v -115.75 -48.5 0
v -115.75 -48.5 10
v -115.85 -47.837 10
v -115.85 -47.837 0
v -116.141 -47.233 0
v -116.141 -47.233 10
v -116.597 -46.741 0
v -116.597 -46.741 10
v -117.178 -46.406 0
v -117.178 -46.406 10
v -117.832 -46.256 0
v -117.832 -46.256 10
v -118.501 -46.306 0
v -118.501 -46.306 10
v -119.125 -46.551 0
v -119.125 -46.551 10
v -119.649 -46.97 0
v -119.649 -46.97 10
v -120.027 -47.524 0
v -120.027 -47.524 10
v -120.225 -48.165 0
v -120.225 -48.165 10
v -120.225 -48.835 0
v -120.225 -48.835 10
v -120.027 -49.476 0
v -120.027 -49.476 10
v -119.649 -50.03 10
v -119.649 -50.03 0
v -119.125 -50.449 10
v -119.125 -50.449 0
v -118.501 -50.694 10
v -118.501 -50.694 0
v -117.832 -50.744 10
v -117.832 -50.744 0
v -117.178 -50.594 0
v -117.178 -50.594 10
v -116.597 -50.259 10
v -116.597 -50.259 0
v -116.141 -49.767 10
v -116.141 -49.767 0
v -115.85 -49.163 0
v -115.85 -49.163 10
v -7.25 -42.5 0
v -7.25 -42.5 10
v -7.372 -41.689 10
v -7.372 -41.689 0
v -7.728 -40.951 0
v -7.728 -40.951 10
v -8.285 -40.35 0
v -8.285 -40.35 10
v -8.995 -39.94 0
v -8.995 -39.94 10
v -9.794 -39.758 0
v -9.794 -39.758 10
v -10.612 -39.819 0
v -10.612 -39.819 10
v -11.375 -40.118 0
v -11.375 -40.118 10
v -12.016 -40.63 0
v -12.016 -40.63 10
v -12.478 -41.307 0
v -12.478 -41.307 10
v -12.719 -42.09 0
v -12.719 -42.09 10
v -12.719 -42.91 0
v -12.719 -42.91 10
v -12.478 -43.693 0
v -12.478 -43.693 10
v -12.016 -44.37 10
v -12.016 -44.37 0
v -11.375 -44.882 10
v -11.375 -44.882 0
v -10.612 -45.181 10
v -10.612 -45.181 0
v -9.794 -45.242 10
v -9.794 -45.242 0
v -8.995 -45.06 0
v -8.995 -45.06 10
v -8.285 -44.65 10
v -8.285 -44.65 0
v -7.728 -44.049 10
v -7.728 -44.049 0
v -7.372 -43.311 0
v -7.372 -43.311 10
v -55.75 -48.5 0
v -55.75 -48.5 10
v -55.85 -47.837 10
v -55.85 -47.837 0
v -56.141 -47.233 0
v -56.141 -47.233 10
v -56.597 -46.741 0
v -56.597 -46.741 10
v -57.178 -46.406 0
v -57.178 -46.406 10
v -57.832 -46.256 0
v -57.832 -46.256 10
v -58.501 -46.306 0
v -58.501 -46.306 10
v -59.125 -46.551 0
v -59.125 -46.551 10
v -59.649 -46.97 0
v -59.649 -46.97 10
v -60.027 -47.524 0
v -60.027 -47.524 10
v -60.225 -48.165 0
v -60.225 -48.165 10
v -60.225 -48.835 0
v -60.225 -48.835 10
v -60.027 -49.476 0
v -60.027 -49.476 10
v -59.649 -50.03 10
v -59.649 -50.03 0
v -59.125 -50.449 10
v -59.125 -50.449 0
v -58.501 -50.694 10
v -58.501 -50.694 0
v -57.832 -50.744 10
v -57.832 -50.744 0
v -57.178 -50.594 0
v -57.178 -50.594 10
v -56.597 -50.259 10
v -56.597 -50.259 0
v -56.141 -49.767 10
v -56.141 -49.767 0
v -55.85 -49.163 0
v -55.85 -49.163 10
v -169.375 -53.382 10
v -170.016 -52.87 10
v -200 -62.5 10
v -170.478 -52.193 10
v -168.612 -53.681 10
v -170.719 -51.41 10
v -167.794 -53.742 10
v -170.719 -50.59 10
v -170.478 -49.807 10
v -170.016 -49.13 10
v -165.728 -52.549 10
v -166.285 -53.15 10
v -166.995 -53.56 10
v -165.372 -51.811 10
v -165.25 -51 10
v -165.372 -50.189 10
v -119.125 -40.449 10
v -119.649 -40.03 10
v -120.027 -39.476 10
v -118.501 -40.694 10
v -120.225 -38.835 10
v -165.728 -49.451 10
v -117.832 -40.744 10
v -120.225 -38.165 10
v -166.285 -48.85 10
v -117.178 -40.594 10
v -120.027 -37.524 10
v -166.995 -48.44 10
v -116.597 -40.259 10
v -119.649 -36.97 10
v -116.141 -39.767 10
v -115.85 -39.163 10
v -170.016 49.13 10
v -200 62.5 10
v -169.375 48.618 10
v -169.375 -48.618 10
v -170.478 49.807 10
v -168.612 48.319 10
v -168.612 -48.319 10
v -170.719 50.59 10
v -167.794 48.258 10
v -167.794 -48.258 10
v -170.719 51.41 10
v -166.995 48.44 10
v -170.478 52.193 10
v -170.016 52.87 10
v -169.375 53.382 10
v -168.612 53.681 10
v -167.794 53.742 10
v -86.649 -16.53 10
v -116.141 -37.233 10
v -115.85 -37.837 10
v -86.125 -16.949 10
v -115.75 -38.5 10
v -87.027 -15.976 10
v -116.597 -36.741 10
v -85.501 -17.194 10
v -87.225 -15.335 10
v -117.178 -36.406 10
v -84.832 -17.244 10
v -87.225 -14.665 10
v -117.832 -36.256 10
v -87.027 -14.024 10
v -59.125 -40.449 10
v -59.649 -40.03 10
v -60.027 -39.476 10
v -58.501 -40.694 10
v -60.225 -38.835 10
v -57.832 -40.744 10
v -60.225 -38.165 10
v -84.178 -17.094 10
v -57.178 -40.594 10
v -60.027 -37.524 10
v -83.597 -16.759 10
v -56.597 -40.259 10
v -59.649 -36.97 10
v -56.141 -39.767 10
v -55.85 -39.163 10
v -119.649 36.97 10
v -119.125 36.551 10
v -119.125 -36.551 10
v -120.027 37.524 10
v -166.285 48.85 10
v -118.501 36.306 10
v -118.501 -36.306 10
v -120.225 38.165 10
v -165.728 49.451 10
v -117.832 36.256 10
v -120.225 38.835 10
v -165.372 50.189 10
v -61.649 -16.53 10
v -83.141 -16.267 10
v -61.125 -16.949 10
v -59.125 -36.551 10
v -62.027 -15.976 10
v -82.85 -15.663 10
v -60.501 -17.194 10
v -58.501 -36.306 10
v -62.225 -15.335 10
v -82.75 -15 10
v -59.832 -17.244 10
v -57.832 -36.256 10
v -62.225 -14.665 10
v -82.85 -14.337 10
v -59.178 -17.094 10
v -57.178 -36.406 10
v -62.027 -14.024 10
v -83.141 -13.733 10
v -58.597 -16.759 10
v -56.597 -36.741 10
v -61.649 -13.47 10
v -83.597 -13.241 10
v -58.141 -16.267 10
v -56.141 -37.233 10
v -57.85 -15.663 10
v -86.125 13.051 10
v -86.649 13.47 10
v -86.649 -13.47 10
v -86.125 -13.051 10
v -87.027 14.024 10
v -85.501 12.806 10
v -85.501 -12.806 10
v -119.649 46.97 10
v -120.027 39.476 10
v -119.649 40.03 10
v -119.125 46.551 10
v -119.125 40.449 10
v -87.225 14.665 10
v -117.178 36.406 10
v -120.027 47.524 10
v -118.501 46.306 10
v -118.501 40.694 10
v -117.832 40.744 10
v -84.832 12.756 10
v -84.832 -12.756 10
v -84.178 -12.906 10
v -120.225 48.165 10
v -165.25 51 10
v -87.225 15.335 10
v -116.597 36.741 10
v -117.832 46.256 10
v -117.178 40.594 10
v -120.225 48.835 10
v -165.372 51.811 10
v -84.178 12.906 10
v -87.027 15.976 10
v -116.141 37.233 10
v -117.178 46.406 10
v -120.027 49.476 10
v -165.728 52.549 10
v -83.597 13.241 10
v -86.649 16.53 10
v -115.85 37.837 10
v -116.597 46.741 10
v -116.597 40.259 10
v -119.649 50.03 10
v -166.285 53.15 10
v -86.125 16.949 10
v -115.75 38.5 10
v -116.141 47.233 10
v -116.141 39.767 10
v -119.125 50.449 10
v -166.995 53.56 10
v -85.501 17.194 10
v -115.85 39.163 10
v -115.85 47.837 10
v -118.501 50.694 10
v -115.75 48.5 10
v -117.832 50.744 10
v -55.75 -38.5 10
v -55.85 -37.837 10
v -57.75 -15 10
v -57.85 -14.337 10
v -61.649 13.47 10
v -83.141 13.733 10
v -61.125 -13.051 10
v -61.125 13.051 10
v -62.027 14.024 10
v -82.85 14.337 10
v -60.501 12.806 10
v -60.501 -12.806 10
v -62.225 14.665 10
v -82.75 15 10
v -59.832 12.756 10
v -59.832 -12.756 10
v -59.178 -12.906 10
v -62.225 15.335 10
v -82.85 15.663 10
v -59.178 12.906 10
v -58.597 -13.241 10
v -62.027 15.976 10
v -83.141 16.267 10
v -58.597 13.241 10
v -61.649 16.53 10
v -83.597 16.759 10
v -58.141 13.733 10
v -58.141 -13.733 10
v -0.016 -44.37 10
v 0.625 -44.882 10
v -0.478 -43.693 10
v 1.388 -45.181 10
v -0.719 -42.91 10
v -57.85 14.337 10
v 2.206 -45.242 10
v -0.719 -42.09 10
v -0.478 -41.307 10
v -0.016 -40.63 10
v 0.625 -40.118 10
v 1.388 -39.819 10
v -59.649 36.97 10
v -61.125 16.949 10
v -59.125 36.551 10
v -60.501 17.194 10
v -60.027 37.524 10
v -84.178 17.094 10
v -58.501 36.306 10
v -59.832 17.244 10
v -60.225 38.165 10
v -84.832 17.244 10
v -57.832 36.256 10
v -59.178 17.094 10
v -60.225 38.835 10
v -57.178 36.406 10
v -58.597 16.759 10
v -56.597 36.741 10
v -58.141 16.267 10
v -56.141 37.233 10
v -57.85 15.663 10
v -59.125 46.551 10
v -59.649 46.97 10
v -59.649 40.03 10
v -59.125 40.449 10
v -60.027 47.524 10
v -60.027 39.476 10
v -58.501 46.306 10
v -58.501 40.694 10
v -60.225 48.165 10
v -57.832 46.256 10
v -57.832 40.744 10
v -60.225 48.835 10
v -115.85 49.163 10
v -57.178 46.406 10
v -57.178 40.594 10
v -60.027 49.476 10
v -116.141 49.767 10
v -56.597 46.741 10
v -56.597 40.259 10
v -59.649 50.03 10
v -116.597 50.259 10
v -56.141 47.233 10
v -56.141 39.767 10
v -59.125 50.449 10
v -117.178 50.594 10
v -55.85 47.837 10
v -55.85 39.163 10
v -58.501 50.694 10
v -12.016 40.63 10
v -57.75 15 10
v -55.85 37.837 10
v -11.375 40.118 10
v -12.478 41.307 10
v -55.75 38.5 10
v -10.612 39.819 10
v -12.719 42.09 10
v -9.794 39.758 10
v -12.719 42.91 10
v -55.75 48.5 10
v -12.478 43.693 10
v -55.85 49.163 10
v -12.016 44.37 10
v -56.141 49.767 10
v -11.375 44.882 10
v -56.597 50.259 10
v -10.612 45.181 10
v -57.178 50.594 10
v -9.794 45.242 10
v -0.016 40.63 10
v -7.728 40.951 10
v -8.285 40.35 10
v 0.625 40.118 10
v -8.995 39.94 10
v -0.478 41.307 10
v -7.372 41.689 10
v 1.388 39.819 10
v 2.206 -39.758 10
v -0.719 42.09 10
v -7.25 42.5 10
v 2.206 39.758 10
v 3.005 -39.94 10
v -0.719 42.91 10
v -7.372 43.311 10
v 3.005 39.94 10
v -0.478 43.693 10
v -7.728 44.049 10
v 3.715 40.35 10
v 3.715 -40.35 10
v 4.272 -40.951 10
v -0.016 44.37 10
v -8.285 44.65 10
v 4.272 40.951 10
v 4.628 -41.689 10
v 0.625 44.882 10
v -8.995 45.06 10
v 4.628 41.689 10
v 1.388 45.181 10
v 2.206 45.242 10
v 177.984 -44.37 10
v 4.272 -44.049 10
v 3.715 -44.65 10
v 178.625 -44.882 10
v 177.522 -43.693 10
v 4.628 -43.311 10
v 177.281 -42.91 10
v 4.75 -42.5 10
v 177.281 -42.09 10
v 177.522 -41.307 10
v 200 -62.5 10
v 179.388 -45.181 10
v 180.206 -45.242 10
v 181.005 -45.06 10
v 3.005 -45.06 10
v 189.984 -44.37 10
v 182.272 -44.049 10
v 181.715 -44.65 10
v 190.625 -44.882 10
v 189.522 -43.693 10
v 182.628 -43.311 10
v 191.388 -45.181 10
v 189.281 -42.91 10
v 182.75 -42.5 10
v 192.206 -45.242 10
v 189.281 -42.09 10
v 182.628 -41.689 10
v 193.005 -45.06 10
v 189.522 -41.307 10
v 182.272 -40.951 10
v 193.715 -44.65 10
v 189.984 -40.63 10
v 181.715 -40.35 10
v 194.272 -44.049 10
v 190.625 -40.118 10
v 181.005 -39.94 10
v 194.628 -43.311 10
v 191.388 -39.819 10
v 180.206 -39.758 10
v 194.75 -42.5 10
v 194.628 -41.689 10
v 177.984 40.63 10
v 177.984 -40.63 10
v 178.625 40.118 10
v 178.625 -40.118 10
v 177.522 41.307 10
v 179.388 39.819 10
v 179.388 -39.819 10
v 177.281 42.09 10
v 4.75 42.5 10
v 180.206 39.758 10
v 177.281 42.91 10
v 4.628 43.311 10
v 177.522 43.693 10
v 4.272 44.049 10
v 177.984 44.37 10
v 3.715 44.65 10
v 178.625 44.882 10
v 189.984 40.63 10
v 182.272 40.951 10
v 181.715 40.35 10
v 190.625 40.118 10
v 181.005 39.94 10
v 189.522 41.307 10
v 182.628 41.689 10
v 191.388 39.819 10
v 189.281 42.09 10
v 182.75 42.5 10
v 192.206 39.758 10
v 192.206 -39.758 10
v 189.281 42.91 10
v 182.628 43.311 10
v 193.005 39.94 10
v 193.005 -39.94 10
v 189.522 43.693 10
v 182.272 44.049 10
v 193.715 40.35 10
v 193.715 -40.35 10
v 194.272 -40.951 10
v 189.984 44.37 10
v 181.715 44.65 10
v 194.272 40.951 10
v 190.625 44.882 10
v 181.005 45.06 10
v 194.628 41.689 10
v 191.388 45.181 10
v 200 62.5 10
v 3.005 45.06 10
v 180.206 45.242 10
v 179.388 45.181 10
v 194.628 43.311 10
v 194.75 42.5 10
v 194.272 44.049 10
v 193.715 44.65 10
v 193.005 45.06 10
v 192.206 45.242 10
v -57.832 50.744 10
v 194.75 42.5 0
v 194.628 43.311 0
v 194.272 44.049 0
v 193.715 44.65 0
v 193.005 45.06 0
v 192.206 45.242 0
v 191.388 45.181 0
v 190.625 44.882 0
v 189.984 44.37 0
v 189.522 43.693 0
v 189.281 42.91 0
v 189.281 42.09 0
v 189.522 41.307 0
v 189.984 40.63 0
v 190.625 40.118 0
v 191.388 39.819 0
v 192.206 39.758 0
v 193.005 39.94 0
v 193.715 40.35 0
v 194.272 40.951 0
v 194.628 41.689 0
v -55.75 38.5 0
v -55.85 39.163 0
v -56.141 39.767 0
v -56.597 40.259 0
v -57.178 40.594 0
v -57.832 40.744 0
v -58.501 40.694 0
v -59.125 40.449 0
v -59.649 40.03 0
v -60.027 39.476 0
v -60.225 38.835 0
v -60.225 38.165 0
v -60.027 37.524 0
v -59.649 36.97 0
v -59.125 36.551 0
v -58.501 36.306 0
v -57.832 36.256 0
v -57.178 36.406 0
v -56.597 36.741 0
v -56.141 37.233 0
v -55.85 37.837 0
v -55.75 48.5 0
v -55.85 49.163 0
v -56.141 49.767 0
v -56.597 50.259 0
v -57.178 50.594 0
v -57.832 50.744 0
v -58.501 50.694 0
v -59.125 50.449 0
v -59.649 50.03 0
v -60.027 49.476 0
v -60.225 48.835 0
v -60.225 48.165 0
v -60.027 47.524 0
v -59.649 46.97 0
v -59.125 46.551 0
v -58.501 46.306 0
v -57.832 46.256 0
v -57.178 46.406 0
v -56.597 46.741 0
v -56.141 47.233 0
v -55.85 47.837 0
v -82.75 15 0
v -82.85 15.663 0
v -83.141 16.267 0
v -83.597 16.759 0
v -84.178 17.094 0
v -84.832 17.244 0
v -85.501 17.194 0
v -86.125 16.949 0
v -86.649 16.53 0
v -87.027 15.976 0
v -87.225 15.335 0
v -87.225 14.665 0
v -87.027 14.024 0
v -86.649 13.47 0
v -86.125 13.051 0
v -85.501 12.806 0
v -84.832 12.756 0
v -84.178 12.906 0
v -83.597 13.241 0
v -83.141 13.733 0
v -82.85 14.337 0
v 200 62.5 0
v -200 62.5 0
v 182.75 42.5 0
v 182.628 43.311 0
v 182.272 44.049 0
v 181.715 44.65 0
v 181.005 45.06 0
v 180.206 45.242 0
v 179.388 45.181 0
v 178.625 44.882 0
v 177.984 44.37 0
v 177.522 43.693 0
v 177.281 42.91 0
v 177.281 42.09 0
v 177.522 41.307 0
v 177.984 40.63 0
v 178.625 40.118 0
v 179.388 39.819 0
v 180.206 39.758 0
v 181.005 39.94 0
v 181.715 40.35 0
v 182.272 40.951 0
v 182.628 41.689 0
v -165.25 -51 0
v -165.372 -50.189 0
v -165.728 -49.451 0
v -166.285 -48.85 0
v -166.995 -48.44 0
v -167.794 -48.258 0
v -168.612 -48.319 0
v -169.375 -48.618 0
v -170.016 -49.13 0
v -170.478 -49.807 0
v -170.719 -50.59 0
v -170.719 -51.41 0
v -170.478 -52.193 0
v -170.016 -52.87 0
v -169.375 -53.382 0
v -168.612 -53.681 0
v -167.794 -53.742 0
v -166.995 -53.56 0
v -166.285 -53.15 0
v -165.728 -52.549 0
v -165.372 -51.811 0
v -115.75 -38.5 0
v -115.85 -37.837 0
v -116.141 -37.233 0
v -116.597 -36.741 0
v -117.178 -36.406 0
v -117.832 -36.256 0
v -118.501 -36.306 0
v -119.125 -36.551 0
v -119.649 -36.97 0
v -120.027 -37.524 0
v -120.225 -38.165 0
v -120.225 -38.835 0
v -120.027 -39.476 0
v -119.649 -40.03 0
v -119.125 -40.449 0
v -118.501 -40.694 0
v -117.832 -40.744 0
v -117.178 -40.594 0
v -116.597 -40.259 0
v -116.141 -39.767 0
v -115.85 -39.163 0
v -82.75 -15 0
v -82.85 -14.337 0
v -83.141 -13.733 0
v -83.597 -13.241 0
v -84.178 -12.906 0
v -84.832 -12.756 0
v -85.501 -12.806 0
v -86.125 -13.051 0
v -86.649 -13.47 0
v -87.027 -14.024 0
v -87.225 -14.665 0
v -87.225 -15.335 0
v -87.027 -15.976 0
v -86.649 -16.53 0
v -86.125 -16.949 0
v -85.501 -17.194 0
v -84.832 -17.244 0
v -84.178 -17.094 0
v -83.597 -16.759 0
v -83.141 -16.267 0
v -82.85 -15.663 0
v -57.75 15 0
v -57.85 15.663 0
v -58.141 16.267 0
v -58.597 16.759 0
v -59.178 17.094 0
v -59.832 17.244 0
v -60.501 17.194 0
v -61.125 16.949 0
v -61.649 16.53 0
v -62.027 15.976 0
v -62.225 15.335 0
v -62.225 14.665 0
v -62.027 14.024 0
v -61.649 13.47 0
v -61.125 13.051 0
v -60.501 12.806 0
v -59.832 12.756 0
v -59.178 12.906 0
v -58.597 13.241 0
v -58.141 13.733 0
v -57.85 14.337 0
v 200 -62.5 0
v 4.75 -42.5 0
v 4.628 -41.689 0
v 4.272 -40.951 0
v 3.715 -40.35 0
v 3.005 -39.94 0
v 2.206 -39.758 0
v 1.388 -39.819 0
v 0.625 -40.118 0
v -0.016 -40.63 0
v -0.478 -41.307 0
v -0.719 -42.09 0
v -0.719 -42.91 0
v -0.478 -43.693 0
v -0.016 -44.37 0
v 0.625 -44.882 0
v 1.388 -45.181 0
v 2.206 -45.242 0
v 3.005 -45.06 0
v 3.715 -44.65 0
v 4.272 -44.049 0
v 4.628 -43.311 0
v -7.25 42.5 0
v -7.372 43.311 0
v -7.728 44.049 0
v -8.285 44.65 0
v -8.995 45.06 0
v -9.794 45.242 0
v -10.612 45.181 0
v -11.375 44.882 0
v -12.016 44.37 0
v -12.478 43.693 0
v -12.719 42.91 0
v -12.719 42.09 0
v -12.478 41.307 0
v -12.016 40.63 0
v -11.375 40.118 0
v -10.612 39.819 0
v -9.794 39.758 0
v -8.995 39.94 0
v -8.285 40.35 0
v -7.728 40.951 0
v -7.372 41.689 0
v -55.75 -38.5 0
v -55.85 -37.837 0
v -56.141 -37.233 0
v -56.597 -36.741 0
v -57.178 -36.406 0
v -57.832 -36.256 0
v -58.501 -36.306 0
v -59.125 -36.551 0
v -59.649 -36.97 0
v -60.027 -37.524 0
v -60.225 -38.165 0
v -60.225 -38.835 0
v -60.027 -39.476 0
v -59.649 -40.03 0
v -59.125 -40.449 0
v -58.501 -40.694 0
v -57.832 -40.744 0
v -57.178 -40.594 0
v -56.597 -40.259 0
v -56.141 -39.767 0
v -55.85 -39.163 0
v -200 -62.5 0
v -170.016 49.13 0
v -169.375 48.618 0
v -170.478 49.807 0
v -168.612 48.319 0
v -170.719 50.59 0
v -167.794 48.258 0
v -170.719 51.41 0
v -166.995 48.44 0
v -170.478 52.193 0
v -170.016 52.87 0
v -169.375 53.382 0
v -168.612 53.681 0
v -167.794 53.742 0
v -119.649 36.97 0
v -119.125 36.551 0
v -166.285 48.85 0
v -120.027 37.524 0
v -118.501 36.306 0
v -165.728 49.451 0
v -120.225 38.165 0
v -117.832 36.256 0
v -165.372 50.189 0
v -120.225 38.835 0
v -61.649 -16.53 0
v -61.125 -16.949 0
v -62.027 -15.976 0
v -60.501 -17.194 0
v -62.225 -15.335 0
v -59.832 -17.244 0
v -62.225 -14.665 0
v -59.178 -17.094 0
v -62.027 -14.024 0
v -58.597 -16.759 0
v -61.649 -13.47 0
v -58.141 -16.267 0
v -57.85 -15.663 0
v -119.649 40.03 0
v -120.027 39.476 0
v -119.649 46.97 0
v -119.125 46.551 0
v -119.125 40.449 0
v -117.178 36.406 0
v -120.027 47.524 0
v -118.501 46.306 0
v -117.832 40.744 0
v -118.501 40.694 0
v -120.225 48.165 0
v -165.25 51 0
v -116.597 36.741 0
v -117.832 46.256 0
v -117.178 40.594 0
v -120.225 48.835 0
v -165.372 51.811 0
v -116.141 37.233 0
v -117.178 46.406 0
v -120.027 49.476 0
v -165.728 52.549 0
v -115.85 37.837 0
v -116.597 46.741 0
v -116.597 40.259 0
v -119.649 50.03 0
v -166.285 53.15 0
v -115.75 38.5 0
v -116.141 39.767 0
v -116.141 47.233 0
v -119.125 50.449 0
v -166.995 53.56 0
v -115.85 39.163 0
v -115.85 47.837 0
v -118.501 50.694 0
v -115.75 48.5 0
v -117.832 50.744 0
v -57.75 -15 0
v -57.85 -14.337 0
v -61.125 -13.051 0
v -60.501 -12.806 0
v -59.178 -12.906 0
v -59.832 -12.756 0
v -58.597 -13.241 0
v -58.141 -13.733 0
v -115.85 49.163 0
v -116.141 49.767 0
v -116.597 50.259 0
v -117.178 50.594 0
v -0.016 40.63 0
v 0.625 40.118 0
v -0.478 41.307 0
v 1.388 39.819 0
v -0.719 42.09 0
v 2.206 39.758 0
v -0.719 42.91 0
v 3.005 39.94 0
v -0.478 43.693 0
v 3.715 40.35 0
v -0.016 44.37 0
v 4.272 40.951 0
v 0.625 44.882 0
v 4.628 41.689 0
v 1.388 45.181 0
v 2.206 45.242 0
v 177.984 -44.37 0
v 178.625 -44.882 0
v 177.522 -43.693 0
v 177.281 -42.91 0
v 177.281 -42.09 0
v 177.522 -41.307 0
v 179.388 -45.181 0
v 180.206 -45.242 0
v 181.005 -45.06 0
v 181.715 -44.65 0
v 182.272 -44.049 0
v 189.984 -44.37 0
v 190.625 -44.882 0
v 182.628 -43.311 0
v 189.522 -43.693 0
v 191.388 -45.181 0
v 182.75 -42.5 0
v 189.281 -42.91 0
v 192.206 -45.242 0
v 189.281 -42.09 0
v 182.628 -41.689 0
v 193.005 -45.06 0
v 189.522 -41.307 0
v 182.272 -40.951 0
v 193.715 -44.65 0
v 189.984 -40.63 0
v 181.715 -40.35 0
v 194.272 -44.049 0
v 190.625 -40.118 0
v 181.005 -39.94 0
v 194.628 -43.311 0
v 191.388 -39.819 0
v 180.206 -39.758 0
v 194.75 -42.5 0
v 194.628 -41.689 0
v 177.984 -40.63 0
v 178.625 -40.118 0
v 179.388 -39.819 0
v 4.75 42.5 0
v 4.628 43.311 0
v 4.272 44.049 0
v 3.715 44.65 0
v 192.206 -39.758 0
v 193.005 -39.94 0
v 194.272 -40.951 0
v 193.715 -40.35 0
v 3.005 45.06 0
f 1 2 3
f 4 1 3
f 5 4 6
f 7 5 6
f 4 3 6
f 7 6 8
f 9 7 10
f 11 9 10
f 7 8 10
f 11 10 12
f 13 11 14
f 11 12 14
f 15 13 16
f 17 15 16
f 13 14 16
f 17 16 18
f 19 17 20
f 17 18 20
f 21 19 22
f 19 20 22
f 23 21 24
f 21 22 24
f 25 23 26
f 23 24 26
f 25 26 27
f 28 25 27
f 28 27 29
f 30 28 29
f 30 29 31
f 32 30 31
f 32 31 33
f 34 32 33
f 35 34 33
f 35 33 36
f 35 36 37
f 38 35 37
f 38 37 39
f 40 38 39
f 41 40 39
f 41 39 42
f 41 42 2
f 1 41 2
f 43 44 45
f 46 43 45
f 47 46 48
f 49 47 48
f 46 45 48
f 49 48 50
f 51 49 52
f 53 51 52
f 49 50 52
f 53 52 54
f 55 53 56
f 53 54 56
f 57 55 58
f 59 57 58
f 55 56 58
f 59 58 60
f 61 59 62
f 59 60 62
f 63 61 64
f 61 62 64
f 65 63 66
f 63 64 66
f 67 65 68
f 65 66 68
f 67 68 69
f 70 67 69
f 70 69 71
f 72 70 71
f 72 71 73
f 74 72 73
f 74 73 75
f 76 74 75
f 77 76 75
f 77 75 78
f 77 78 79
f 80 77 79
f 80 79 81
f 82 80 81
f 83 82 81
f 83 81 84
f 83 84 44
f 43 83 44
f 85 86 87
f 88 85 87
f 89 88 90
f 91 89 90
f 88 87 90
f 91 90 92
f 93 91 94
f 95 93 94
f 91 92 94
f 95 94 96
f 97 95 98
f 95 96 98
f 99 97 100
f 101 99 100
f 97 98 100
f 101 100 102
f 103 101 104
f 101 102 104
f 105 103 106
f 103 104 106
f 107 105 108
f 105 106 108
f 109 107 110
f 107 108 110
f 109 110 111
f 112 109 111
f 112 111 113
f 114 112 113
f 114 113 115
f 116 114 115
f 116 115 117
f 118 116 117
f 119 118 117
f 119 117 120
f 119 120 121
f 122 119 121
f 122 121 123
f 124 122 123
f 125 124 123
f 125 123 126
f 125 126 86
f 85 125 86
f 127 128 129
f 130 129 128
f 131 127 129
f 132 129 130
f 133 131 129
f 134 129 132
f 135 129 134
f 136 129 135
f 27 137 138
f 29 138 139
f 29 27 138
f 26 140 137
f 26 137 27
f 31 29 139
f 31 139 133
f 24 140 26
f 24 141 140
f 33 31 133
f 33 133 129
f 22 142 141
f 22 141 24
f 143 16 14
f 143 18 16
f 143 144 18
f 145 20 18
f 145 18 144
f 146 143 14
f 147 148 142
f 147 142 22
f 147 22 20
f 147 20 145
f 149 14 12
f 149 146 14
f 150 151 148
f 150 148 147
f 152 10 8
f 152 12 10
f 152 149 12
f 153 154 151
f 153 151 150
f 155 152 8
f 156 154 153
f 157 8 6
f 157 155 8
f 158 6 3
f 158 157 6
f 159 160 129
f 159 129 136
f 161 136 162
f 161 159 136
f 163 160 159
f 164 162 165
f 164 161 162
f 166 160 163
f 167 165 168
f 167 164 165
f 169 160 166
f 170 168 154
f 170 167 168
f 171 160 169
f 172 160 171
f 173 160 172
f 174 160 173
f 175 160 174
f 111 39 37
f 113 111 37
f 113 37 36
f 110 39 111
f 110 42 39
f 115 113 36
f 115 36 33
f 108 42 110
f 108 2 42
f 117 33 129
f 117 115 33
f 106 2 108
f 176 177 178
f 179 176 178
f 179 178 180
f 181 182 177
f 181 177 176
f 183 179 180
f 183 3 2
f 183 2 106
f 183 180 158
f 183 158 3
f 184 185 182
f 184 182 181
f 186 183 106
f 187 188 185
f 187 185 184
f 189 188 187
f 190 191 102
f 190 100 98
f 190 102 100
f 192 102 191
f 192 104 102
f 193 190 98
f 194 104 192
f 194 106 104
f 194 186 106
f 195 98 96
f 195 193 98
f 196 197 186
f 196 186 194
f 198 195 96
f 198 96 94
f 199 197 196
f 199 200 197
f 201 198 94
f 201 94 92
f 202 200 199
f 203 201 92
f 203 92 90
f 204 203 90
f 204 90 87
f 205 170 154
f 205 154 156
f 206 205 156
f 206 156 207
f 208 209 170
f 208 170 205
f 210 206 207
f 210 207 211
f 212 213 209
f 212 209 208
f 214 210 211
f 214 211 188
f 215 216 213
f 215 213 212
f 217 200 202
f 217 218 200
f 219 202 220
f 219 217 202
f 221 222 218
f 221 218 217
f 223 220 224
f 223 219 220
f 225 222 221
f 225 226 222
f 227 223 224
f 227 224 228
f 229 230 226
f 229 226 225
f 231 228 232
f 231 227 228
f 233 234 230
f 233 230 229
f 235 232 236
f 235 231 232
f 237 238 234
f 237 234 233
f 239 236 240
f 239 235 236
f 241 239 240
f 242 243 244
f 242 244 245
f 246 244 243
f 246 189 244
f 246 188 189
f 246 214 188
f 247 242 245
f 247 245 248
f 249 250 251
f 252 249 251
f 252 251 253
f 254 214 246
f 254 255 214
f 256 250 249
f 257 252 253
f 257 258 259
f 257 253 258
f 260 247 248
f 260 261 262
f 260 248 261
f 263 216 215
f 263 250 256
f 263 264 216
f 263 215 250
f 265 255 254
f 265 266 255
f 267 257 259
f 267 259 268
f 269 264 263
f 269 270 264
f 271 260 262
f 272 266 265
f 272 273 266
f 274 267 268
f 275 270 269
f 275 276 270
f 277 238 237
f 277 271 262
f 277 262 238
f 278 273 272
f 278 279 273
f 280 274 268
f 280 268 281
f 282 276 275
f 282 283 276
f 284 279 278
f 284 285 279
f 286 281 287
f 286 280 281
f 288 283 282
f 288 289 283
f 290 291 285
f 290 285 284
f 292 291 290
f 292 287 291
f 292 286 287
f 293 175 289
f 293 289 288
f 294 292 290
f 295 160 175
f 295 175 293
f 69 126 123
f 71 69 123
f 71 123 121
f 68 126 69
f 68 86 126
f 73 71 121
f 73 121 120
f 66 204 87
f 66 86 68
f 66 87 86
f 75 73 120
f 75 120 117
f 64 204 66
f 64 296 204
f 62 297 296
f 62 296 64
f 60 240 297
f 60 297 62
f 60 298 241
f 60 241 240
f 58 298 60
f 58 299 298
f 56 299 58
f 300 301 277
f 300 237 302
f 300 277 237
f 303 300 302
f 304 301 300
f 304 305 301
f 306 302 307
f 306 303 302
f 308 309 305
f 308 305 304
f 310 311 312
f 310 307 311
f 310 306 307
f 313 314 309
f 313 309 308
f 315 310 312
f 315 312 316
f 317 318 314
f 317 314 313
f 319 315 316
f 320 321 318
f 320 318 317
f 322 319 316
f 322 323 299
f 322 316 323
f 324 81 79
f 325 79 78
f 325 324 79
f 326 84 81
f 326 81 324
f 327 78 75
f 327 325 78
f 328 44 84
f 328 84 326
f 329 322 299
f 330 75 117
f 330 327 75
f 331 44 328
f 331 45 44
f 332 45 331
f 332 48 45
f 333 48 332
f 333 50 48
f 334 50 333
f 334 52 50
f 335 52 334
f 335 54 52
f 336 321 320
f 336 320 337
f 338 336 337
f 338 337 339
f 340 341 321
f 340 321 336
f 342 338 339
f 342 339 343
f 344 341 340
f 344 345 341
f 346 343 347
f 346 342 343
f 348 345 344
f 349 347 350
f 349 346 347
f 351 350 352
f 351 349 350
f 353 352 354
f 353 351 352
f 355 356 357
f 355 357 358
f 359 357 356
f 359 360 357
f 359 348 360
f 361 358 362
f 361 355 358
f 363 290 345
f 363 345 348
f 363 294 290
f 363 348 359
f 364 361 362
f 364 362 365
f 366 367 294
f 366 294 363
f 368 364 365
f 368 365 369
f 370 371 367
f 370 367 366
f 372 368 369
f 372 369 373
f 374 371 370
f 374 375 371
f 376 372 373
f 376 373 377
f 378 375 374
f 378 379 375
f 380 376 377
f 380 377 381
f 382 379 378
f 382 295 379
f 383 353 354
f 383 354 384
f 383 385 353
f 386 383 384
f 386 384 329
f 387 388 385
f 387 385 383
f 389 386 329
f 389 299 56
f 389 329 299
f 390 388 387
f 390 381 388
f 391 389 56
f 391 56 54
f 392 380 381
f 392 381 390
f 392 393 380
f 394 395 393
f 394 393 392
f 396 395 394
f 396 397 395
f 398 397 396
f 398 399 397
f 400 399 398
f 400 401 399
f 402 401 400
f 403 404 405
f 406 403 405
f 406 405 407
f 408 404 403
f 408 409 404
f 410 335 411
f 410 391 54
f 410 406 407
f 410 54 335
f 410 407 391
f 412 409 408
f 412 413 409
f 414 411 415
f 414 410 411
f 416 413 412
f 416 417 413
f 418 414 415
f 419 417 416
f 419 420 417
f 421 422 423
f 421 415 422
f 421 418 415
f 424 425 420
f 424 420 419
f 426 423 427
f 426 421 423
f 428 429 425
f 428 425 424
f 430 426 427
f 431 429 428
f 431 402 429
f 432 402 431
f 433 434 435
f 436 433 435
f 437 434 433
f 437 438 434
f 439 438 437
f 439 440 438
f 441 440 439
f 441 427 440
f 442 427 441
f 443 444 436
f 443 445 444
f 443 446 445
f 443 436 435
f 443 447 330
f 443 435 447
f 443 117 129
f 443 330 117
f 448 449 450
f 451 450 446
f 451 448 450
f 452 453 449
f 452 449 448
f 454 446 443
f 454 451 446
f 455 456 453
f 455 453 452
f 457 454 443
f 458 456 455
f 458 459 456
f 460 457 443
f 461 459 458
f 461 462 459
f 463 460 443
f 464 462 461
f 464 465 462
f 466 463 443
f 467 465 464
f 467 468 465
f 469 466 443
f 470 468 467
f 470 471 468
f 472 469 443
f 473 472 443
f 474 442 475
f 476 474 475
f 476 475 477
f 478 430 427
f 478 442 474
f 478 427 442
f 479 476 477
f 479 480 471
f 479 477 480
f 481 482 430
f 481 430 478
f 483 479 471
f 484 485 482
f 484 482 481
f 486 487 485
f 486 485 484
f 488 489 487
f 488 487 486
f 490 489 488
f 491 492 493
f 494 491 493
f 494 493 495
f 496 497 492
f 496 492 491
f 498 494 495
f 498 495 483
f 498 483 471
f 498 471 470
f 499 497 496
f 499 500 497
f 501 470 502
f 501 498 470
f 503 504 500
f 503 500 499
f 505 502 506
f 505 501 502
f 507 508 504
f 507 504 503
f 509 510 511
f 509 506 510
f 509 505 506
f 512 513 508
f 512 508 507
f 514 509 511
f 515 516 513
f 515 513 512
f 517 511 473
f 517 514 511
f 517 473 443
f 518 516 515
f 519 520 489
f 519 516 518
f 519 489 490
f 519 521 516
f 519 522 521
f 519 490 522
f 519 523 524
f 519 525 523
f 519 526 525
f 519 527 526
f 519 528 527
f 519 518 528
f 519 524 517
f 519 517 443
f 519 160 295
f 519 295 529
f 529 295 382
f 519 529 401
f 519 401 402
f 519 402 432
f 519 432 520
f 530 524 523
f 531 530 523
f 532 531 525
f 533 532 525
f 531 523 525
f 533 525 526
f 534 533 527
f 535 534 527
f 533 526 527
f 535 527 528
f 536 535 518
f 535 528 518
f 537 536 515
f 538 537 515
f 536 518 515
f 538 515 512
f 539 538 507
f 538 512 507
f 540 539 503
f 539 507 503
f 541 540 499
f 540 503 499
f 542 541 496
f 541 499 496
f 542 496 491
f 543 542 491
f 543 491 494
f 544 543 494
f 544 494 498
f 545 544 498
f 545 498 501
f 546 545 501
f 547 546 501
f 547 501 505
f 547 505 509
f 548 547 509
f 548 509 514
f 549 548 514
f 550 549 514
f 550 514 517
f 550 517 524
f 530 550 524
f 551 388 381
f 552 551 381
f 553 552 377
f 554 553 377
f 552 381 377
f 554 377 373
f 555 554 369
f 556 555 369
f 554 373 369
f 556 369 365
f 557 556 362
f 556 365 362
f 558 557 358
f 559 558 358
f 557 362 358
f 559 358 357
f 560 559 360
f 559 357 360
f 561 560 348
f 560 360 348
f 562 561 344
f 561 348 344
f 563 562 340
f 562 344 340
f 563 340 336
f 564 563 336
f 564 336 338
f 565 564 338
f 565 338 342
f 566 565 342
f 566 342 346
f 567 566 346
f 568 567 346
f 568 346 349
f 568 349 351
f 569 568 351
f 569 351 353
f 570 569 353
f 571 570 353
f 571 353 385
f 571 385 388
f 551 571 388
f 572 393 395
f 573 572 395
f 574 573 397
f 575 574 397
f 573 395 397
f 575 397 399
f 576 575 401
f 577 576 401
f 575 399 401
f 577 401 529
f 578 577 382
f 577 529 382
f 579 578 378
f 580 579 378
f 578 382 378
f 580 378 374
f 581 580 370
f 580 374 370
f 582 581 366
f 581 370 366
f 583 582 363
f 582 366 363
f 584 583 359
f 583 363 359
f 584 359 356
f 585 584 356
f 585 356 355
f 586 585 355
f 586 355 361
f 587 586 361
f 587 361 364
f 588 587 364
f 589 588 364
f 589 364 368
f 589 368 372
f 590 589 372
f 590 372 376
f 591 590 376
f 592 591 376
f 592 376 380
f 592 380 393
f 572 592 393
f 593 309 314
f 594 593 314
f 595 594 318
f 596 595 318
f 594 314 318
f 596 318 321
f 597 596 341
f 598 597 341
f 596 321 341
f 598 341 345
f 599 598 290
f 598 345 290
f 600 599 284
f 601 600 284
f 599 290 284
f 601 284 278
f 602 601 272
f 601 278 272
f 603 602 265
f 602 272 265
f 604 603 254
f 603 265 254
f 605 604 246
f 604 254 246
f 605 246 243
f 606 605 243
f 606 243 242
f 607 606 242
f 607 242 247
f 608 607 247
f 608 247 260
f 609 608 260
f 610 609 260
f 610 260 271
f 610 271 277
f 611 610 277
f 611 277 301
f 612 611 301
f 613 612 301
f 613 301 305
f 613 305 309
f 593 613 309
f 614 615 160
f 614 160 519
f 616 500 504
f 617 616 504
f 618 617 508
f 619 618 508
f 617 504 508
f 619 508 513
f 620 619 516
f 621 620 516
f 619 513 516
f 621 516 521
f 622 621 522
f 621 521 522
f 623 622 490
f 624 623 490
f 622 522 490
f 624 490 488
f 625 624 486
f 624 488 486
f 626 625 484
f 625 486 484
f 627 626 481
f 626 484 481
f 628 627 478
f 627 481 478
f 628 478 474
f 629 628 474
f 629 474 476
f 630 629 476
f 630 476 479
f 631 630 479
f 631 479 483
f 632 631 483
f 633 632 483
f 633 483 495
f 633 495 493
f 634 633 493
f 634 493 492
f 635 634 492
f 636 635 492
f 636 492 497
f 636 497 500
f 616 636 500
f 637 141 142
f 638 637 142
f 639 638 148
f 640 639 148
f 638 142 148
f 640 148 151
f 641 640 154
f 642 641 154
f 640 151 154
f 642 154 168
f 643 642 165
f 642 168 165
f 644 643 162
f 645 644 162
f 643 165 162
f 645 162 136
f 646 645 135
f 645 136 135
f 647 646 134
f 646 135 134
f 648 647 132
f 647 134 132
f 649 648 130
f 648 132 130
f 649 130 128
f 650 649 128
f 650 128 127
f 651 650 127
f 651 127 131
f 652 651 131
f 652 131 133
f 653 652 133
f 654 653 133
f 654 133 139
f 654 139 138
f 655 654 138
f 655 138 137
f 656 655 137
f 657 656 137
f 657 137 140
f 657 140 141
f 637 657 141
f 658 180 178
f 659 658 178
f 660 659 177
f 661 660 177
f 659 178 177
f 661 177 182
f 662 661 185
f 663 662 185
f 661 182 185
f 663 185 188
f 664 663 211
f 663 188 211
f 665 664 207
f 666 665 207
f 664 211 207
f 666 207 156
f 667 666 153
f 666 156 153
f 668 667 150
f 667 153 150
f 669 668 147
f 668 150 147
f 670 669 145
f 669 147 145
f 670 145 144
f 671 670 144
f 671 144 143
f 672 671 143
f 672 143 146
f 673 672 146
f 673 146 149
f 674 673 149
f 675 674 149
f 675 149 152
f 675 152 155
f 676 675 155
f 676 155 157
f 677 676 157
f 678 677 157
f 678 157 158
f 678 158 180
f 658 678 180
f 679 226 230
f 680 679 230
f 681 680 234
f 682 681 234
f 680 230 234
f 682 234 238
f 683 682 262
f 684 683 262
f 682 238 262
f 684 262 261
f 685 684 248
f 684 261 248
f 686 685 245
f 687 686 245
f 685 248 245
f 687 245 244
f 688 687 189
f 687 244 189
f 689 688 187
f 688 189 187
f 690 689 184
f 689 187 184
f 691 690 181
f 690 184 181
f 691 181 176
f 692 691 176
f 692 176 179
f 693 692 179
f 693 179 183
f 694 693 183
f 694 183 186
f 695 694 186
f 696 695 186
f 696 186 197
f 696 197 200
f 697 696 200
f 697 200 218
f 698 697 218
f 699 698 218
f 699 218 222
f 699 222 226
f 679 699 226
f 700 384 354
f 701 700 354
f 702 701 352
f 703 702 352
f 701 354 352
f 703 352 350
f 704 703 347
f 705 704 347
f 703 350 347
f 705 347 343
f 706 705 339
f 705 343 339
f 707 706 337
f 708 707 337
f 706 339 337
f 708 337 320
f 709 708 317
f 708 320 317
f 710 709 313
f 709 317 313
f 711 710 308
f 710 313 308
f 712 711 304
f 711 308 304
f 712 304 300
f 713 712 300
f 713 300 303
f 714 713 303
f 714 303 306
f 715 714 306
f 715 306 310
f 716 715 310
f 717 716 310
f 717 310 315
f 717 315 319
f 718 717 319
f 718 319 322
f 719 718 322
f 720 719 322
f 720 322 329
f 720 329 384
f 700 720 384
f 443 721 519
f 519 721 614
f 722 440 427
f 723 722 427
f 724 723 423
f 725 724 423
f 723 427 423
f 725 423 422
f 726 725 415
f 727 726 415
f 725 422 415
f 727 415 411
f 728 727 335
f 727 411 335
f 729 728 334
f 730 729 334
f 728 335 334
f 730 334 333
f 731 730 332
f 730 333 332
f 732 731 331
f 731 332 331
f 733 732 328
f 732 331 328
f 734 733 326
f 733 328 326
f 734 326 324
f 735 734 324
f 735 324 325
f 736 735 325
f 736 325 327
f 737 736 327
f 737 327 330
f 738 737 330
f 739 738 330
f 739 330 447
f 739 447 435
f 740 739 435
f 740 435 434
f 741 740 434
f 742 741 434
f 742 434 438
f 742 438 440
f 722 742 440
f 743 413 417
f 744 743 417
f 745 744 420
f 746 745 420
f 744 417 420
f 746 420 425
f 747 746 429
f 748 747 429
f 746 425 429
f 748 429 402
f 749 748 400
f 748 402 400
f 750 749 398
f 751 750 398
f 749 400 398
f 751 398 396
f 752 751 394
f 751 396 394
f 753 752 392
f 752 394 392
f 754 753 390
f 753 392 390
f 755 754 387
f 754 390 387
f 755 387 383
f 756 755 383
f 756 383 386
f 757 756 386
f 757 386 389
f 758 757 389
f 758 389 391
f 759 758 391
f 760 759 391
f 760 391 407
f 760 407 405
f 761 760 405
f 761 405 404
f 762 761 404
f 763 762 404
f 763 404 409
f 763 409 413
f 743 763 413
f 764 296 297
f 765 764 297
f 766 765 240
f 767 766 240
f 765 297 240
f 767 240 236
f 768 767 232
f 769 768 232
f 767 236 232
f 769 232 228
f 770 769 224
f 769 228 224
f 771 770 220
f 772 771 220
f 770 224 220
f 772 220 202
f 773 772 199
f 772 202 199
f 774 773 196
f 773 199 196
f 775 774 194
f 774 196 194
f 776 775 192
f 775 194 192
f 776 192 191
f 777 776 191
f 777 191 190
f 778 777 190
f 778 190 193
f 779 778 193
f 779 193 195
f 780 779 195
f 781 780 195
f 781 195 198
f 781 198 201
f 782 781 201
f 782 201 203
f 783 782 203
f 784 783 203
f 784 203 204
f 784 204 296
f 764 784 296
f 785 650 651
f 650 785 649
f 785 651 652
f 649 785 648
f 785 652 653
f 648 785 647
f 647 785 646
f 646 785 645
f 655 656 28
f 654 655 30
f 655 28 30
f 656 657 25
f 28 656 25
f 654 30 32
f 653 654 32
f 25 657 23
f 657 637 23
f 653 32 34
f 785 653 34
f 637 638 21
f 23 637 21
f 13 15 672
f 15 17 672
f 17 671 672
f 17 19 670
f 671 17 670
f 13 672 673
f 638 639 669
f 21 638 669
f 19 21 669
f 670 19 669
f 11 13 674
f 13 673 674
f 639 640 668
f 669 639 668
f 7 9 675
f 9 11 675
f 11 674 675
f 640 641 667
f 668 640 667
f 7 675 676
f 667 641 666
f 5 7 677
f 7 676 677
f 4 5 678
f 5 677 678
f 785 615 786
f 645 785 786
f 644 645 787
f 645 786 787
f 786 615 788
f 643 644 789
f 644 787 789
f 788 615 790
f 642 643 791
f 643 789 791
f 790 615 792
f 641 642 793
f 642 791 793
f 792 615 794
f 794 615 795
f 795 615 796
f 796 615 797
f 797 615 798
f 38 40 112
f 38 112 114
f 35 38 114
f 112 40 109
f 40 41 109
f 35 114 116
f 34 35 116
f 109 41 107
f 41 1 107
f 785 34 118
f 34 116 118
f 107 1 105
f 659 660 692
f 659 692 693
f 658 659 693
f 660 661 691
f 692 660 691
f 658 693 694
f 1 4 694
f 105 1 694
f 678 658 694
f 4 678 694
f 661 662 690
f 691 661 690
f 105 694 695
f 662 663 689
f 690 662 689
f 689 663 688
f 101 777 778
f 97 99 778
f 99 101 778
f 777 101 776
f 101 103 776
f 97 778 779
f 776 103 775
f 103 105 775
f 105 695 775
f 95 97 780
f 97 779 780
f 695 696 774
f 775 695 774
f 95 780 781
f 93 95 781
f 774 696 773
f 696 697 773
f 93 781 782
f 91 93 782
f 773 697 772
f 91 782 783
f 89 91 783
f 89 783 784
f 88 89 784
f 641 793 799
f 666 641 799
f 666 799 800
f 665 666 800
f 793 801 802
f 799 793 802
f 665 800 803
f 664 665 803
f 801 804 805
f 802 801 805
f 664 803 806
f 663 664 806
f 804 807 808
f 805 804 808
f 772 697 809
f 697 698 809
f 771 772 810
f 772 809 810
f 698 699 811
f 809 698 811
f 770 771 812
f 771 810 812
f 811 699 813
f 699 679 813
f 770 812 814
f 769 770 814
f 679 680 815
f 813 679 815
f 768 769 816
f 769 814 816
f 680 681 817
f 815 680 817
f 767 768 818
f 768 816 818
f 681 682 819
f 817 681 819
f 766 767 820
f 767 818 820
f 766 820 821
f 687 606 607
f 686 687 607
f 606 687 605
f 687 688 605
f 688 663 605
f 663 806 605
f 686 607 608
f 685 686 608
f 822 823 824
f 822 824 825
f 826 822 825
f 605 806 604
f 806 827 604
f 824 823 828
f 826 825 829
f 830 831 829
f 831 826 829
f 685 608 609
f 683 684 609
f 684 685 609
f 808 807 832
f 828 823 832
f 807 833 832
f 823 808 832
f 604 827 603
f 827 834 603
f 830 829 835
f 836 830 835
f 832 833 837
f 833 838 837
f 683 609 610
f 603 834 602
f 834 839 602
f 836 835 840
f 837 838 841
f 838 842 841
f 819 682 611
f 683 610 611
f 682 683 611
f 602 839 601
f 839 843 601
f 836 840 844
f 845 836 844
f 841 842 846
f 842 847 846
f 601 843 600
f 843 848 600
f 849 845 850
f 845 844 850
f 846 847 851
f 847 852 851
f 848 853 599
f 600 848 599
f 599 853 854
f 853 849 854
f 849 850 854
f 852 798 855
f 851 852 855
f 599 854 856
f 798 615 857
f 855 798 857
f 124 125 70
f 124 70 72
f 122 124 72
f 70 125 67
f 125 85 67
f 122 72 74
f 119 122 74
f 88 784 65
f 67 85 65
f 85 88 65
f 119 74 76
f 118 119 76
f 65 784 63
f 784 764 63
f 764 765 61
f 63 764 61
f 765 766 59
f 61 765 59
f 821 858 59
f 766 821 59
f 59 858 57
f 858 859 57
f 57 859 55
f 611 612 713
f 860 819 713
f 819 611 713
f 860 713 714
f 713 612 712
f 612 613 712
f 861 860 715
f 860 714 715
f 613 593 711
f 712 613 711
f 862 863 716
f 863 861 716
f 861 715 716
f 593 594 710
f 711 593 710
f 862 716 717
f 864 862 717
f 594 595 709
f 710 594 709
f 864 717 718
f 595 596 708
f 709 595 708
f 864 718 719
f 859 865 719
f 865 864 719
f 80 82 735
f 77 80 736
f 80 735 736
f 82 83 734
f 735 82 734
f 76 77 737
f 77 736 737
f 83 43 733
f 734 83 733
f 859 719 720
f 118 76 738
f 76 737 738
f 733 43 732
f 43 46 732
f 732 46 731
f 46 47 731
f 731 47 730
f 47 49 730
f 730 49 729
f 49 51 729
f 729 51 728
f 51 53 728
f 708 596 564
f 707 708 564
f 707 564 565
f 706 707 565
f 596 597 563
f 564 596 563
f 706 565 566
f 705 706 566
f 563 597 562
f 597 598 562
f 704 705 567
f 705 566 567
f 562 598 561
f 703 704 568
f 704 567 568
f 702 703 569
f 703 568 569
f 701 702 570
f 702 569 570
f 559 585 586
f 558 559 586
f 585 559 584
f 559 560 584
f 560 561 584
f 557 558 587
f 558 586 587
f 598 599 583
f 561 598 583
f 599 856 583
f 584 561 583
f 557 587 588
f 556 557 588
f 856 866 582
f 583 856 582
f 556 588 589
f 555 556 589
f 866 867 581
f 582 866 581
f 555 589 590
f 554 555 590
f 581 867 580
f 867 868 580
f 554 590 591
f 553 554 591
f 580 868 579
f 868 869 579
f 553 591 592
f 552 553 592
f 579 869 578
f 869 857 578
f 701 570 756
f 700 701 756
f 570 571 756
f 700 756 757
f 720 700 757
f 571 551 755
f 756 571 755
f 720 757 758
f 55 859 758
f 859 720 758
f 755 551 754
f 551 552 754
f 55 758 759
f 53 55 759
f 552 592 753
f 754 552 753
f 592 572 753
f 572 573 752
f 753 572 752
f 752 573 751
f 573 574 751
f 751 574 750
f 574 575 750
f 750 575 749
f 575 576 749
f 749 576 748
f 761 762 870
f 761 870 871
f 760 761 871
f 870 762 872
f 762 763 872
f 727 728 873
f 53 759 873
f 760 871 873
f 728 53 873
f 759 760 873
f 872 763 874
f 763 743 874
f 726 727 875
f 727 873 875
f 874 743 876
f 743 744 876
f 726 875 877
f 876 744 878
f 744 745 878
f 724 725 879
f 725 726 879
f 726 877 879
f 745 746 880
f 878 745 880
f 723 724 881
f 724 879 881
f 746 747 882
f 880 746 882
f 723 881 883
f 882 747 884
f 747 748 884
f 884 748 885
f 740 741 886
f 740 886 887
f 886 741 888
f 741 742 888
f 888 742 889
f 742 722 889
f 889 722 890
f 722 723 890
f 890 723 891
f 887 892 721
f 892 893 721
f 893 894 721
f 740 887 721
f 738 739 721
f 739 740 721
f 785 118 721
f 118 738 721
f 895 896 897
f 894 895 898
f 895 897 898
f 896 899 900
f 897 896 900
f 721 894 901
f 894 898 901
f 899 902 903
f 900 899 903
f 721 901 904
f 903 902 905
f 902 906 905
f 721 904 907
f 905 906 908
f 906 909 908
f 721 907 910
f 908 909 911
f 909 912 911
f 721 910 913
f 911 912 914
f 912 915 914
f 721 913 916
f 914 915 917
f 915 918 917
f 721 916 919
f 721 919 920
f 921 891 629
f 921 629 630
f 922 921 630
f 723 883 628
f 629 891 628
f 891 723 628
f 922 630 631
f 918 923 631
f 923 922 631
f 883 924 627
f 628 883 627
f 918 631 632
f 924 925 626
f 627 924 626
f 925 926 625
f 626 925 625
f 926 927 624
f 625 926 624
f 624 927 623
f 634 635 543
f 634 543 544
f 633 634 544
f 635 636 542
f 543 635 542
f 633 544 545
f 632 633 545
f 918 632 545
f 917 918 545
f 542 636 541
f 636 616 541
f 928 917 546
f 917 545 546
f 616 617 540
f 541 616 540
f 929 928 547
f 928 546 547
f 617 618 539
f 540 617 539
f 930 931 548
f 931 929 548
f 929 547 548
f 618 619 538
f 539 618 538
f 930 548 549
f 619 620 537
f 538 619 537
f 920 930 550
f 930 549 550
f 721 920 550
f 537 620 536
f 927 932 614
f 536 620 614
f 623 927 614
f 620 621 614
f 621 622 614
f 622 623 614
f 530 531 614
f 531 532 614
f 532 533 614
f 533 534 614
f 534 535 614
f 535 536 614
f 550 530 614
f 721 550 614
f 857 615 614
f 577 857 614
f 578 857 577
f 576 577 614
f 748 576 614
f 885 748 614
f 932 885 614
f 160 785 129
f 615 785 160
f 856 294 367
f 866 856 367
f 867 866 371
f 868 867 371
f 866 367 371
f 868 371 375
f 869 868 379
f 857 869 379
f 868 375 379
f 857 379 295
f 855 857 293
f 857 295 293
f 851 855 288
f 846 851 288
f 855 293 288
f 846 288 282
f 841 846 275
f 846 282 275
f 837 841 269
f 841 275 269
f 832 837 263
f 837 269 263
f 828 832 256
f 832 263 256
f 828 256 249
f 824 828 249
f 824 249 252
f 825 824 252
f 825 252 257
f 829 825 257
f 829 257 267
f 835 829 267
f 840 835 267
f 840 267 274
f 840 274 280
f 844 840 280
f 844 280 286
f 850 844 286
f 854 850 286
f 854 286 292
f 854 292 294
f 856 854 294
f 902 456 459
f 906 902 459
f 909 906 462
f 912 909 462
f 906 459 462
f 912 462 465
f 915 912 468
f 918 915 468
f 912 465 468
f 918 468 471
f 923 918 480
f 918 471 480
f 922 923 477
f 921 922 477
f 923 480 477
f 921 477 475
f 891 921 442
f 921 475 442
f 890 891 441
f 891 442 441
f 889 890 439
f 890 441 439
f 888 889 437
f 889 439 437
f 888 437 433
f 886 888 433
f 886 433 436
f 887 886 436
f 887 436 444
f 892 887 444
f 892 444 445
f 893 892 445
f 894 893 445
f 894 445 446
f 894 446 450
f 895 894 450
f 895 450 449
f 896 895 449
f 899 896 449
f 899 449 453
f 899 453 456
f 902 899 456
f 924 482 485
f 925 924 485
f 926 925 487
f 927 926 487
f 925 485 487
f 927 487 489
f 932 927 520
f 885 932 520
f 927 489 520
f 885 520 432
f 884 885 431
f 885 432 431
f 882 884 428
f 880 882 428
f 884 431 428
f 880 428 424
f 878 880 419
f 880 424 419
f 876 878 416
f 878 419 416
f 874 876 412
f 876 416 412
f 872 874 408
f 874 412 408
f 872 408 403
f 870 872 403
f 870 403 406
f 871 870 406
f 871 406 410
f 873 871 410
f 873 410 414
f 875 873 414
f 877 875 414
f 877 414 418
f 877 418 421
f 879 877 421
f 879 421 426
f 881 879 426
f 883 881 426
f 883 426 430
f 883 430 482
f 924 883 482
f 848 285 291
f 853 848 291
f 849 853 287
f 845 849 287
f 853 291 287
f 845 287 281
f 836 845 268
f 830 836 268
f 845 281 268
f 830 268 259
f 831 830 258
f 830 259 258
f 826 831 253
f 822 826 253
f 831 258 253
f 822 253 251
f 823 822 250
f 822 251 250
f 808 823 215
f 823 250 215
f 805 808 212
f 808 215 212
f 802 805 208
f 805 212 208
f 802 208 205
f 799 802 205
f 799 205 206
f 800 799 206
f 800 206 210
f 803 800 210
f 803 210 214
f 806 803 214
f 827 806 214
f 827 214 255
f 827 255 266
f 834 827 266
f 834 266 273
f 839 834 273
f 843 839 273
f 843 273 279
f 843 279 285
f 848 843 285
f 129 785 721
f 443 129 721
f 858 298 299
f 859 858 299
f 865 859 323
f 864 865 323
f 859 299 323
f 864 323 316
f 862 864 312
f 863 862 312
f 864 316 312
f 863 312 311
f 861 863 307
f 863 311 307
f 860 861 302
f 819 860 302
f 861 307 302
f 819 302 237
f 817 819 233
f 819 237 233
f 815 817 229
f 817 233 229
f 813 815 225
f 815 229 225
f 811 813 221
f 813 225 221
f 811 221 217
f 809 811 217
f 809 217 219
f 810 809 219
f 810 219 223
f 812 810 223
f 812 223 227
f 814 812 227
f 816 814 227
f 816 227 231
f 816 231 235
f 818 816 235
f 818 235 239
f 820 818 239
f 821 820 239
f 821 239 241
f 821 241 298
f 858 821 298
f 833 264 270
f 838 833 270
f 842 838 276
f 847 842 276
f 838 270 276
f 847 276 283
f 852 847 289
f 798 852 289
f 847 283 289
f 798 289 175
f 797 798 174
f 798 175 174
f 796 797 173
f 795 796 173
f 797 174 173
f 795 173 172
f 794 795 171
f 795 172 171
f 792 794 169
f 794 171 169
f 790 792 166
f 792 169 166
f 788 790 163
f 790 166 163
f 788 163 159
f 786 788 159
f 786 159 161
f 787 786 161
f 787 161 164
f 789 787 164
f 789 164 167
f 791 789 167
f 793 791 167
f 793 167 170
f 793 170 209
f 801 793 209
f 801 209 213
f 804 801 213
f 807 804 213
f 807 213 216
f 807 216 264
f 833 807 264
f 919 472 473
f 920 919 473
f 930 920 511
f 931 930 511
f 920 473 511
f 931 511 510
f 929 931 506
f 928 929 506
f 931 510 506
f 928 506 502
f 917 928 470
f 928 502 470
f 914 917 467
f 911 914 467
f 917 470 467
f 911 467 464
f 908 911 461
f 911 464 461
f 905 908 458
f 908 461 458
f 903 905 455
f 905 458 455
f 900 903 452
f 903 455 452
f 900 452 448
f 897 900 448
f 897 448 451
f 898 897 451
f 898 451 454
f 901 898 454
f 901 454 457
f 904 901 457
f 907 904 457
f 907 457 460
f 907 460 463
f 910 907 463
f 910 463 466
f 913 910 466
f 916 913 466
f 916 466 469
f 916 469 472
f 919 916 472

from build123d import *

# Parameters (mm, degrees)
SKETCH1_W                    = 400
SKETCH1_H                    = 125
BOSS_EXTRUDE1_DEPTH          = 10
TALADRO_DE_MARGEN_PARA_M51_D = 5.5
TALADRO_DE_MARGEN_PARA_M41_D = 4.5


with BuildPart() as part:
    # Sketch1 → Boss-Extrude1 (new body)
    with BuildSketch(Plane.XY):
        Rectangle(SKETCH1_W, SKETCH1_H)
    extrude(amount=BOSS_EXTRUDE1_DEPTH)

    # Taladro de margen para M51 (through all)
    with Locations(Plane(origin=(0, 0, 0), x_dir=(-1, 0, 0), z_dir=(0, 0, -1))):
        with Locations((-192, 42.5), (-180, 42.5), (-192, -42.5), (-180, -42.5), (-2, 42.5), (10, 42.5), (-2, -42.5), (10, -42.5), (168, 51), (168, -51)):
            Hole(TALADRO_DE_MARGEN_PARA_M51_D / 2)

    # Taladro de margen para M41 (through all)
    with Locations(Plane(origin=(0, 0, 0), x_dir=(-1, 0, 0), z_dir=(0, 0, -1))):
        with Locations((58, 38.5), (118, 38.5), (118, -38.5), (58, -38.5), (60, -15), (85, -15), (85, 15), (60, 15), (58, -48.5), (118, -48.5), (58, 48.5), (118, 48.5)):
            Hole(TALADRO_DE_MARGEN_PARA_M41_D / 2)


solid = part.part
